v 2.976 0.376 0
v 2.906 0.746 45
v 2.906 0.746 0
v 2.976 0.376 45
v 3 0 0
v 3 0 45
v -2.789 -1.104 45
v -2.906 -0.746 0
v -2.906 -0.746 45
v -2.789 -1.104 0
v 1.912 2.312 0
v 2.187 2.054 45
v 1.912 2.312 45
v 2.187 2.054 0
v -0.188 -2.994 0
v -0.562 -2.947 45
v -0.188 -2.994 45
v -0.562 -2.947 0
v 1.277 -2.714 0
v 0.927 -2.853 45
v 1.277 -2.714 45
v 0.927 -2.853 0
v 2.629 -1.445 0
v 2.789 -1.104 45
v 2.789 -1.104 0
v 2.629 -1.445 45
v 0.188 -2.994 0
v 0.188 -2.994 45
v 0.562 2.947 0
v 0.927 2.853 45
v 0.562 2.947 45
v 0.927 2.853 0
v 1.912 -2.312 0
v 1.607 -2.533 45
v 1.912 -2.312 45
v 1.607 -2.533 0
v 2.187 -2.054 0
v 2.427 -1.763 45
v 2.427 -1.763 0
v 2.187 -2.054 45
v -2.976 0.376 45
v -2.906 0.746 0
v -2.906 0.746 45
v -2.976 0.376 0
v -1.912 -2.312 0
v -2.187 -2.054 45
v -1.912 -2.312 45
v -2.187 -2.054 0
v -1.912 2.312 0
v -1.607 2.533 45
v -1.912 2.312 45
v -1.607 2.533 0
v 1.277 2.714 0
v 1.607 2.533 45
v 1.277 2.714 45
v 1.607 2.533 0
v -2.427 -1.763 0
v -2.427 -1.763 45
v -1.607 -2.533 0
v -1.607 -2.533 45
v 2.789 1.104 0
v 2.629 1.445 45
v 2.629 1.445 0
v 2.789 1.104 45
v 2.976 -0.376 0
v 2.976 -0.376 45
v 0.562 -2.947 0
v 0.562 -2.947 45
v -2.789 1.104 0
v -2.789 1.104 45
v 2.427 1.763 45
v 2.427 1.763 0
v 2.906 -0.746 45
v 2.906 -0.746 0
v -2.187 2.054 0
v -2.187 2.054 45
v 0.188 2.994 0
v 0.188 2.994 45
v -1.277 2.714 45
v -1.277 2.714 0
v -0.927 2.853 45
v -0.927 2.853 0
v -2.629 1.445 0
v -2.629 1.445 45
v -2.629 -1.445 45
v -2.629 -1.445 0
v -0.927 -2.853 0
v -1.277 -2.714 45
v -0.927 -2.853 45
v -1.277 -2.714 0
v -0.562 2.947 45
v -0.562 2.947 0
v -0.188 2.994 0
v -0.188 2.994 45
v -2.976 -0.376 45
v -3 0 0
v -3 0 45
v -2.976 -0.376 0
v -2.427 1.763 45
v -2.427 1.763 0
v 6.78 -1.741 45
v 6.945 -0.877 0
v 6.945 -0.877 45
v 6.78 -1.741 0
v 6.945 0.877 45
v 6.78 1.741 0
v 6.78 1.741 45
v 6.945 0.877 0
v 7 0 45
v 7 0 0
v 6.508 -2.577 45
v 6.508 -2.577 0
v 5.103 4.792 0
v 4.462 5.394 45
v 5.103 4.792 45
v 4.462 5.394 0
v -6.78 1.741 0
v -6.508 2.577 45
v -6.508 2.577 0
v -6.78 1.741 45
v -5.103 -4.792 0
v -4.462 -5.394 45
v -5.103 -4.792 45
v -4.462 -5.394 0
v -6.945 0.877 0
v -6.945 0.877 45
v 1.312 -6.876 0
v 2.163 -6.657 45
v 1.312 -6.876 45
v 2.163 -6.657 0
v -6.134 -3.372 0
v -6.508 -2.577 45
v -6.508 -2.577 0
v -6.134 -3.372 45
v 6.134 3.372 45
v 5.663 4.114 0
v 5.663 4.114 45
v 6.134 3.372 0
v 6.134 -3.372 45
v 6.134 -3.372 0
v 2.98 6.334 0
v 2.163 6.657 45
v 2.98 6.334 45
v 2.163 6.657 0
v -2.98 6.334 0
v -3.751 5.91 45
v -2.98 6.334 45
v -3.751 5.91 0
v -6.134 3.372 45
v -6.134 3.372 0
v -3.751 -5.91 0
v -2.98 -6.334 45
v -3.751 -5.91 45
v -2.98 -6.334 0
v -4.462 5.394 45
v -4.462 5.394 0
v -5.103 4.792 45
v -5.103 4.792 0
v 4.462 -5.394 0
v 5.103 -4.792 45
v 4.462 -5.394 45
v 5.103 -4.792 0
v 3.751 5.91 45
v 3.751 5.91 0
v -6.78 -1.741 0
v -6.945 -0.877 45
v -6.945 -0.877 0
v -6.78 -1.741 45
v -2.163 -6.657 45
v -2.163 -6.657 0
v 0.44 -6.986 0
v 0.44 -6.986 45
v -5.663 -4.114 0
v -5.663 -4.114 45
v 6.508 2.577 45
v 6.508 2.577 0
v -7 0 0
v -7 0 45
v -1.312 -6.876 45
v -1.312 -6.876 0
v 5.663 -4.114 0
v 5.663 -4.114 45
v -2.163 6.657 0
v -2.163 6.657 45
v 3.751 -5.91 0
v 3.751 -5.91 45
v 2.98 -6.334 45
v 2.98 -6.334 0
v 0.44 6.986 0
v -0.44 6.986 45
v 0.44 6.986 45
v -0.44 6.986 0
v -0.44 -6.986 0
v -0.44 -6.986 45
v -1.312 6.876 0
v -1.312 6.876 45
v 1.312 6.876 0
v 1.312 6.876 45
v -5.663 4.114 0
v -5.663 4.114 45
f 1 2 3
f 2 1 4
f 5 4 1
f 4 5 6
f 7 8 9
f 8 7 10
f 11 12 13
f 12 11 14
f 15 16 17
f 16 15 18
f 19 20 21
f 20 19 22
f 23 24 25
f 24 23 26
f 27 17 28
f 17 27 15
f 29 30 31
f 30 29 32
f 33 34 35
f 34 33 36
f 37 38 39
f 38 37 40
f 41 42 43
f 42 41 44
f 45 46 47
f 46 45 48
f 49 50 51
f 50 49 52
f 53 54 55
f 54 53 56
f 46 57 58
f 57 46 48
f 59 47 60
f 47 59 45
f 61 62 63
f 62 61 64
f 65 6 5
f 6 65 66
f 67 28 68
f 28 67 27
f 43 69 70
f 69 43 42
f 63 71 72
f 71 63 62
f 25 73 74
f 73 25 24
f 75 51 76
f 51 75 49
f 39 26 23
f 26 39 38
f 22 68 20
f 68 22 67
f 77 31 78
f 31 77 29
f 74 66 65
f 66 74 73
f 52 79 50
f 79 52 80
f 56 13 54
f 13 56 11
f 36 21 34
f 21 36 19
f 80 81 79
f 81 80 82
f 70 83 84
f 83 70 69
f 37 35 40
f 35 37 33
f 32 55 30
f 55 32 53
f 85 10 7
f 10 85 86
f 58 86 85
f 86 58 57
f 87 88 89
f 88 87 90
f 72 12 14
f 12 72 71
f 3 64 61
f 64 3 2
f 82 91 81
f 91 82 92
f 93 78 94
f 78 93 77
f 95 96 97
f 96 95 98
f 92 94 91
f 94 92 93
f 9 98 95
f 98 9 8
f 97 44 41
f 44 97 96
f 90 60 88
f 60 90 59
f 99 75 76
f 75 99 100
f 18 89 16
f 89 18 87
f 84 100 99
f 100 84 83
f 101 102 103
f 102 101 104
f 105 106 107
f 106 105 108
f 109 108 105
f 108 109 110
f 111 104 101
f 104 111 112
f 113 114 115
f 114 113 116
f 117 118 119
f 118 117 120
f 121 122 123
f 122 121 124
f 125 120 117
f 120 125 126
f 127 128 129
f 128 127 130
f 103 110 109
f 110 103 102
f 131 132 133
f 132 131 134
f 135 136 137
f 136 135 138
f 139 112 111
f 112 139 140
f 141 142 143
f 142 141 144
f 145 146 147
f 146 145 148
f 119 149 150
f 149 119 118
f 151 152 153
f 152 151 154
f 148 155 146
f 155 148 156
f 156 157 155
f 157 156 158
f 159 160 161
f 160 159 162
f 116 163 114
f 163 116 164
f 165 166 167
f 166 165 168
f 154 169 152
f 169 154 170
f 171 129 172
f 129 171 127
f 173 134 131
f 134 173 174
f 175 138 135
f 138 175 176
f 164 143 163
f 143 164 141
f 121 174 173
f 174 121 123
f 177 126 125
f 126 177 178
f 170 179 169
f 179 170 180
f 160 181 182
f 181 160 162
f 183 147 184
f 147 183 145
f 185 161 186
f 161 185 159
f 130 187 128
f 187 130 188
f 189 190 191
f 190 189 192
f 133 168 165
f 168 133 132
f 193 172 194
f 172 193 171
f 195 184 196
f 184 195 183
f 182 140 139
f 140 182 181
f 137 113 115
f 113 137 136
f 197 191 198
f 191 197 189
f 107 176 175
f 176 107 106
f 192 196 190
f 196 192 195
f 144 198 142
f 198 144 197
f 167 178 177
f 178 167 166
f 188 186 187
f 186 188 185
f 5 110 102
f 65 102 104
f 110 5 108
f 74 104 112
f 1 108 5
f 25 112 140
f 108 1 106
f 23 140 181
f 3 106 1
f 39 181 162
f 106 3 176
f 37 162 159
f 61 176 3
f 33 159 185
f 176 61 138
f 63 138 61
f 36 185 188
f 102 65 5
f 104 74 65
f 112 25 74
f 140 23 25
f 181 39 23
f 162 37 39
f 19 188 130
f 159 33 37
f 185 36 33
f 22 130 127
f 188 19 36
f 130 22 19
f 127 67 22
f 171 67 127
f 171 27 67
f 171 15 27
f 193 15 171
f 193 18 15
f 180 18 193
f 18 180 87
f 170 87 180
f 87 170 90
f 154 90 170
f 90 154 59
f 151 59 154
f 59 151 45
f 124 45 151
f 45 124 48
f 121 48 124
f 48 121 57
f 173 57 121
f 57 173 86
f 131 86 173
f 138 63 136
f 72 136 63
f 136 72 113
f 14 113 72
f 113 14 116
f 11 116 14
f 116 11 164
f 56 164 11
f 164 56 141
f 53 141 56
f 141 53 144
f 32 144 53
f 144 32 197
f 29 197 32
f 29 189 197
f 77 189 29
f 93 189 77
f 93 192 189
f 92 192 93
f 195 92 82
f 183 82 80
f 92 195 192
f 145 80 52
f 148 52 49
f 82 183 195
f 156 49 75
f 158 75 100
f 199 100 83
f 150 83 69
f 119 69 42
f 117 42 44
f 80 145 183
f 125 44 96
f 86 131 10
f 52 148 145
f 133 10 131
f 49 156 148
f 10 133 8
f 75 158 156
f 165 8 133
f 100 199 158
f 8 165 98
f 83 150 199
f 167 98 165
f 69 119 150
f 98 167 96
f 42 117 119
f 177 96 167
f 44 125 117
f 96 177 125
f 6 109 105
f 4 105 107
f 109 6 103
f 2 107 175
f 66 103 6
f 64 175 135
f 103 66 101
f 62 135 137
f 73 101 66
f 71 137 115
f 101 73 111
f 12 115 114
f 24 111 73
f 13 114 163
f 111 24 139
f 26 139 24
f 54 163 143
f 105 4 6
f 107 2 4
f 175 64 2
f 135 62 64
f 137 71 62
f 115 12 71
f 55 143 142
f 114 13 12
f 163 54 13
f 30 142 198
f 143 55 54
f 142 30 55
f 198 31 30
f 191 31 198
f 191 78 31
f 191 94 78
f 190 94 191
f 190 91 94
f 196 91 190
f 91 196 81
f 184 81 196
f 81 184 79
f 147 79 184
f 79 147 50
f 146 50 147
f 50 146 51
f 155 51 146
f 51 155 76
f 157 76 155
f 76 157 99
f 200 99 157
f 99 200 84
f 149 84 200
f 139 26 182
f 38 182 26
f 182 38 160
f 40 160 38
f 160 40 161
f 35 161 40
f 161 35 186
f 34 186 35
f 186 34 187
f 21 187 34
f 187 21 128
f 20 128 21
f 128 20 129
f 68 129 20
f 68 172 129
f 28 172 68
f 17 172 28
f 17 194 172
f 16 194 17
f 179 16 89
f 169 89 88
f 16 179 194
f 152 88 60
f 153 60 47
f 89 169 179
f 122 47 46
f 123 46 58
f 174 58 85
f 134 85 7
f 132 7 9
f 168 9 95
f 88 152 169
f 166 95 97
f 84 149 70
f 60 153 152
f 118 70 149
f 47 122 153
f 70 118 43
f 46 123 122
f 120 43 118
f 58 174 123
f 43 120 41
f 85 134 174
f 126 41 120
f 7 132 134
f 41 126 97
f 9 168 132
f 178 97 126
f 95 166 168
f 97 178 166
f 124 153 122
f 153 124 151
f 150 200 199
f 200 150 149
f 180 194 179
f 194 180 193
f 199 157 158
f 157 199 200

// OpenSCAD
$fn = 50;


difference() {
	union() {
		cylinder(h = 45, r = 7.0000000000);
	}
	union() {
		translate(v = [0, 0, -100]) {
			cylinder(h = 200, r = 3.0000000000);
		}
		translate(v = [0, 0, -100]) {
			cylinder(h = 200, r = 1.5000000000);
		}
	}
}
